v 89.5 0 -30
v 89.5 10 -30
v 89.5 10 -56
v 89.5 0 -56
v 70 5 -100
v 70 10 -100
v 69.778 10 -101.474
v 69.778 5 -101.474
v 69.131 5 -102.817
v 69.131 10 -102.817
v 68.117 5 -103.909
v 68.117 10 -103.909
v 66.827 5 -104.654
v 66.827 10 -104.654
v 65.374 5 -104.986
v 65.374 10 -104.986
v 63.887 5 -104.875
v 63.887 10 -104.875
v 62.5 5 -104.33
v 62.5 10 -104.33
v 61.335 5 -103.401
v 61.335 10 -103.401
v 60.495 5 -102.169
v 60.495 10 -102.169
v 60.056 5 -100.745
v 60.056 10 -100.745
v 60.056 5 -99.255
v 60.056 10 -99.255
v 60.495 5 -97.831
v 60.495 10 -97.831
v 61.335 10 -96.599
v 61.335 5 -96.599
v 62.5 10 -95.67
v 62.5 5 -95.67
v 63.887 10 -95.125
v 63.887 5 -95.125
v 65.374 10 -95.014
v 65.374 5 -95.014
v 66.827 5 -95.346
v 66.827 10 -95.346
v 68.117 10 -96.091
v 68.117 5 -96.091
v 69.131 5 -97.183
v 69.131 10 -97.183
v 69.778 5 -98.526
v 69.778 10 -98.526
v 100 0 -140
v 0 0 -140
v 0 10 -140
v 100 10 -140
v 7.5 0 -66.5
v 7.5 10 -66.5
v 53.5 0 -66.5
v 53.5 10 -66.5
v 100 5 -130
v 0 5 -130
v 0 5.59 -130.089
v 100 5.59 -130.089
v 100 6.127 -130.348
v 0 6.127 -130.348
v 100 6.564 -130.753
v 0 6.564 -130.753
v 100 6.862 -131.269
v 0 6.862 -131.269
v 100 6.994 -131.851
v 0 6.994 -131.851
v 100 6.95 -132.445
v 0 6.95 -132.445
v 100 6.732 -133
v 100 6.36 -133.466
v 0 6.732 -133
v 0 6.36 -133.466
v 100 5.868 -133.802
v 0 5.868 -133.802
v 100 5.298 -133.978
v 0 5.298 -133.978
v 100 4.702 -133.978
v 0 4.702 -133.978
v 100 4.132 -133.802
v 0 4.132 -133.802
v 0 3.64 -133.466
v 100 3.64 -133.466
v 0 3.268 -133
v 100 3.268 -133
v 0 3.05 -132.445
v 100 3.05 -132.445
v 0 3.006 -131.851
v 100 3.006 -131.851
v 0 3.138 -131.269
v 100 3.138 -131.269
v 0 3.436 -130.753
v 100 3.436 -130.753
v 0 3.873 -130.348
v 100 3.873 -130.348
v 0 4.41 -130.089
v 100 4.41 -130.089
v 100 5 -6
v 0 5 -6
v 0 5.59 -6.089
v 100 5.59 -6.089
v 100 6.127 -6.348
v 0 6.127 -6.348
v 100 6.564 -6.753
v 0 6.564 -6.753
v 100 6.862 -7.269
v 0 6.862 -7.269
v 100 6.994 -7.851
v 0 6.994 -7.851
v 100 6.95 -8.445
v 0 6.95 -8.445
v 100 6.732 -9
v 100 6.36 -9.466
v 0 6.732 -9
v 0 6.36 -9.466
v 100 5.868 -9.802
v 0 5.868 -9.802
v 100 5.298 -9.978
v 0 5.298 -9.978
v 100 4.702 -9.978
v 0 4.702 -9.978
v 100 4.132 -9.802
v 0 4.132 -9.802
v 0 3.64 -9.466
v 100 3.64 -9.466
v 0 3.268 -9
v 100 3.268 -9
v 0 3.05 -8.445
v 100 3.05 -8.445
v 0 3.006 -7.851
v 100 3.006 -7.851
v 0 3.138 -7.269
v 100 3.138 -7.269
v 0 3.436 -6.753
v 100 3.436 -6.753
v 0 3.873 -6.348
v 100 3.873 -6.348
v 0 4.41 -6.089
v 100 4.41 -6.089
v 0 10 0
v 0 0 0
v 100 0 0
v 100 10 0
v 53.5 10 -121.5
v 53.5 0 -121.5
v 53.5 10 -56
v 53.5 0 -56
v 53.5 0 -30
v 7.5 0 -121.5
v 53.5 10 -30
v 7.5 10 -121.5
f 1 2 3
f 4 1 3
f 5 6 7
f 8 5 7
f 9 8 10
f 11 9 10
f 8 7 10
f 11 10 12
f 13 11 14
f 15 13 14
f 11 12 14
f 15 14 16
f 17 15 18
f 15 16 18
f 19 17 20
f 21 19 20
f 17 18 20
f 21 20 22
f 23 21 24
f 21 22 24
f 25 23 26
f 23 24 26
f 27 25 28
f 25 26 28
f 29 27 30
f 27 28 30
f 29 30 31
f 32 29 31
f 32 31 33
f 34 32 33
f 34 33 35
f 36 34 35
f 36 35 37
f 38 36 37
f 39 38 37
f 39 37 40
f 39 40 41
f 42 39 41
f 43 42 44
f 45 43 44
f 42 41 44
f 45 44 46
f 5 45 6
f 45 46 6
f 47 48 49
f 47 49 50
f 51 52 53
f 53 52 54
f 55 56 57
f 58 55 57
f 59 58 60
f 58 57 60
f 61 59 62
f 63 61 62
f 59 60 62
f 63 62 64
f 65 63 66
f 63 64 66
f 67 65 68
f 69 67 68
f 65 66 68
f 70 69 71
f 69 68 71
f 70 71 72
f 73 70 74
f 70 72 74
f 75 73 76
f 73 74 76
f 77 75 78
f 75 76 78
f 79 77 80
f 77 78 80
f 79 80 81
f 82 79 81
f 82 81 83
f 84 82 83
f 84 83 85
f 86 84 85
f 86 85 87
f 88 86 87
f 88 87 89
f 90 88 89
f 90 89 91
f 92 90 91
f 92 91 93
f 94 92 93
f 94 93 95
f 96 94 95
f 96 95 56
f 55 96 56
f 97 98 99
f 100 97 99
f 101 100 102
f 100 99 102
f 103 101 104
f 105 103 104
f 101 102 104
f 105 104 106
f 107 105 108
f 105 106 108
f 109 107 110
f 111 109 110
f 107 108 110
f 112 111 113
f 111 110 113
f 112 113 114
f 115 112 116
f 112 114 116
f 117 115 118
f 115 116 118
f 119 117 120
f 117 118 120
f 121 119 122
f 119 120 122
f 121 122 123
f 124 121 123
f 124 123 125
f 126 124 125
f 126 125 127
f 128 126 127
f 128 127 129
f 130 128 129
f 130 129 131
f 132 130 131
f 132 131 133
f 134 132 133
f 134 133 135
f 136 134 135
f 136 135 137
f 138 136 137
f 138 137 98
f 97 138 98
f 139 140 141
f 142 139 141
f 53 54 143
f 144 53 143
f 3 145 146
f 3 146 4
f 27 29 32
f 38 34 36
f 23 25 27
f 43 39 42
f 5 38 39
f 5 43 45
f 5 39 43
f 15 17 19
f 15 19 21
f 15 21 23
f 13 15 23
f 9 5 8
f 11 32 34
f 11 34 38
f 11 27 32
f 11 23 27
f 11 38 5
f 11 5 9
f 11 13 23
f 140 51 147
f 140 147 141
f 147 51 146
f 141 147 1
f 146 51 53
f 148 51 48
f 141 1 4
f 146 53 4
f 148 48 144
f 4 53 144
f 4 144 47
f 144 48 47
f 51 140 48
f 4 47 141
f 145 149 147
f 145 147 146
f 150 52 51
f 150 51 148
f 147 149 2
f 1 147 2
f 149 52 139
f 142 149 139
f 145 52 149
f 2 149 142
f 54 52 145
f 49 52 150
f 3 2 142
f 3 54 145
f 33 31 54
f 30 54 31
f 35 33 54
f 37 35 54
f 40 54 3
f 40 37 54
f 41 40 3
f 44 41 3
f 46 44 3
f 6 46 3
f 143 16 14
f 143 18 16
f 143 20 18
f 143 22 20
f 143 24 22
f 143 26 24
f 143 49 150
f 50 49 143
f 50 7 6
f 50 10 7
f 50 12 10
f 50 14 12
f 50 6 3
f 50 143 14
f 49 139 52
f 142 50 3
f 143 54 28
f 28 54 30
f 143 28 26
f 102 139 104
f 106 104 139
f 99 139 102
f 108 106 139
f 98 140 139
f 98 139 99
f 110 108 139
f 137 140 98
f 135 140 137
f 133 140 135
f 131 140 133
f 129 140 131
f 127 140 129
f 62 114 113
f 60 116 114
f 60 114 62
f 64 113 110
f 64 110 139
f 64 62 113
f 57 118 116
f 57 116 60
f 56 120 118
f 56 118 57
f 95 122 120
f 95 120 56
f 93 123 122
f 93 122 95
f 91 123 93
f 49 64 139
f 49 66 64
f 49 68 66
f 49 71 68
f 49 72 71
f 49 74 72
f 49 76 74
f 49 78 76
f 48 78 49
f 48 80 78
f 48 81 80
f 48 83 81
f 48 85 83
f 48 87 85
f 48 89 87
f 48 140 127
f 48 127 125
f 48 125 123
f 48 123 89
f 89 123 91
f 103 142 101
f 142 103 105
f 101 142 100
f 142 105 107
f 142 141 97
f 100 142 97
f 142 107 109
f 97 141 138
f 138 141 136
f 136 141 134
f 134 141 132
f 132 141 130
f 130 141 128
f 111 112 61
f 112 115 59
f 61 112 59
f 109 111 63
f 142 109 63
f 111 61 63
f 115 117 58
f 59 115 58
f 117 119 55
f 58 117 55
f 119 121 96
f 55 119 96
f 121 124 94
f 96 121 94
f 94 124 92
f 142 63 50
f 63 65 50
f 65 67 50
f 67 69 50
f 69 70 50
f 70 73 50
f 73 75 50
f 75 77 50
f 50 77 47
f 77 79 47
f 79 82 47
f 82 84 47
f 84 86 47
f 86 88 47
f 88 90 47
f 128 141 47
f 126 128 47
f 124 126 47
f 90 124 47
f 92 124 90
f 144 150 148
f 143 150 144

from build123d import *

# Parameters (mm, degrees)
SKETCH2_W           = 100
SKETCH2_H           = 140
BOSS_EXTRUDE1_DEPTH = 10
SKETCH3_R           = 5
MOUNTHOLE_DEPTH     = 5
SKETCH4_R           = 2
CUT_EXTRUDE2_DEPTH  = 101
SKETCH5_R           = 2
CUT_EXTRUDE3_DEPTH  = 101
SKETCH21_W          = 46
SKETCH21_H          = 55
SKETCH21_W_2        = 36
SKETCH21_H_2        = 26
CUT_EXTRUDE10_DEPTH = 11


with BuildPart() as part:
    # Sketch2 → Boss-Extrude1 (new body)
    with BuildSketch(Plane(origin=(0, 0, 0), x_dir=(1, 0, 0), z_dir=(0, 1, 0))):
        with Locations((50, 70)):
            Rectangle(SKETCH2_W, SKETCH2_H)
    extrude(amount=BOSS_EXTRUDE1_DEPTH)

    # Sketch3 → MountHole (cut)
    with BuildSketch(Plane(origin=(0, 10, 0), x_dir=(1, 0, 0), z_dir=(0, 1, 0))):
        with Locations((65, 100)):
            Circle(SKETCH3_R)
    extrude(amount=-MOUNTHOLE_DEPTH, mode=Mode.SUBTRACT)

    # Sketch4 → Cut-Extrude2 (cut, through all)
    with BuildSketch(Plane.ZY):
        with Locations((-8, 5)):
            Circle(SKETCH4_R)
    extrude(amount=-CUT_EXTRUDE2_DEPTH, mode=Mode.SUBTRACT)

    # Sketch5 → Cut-Extrude3 (cut, through all)
    with BuildSketch(Plane.ZY):
        with Locations((-132, 5)):
            Circle(SKETCH5_R)
    extrude(amount=-CUT_EXTRUDE3_DEPTH, mode=Mode.SUBTRACT)

    # Sketch21 → Cut-Extrude10 (cut, through all)
    with BuildSketch(Plane(origin=(0, 10, 0), x_dir=(1, 0, 0), z_dir=(0, 1, 0))):
        with Locations((30.5, 94)):
            Rectangle(SKETCH21_W, SKETCH21_H)
        with Locations((71.5, 43)):
            Rectangle(SKETCH21_W_2, SKETCH21_H_2)
    extrude(amount=-CUT_EXTRUDE10_DEPTH, mode=Mode.SUBTRACT)


solid = part.part
